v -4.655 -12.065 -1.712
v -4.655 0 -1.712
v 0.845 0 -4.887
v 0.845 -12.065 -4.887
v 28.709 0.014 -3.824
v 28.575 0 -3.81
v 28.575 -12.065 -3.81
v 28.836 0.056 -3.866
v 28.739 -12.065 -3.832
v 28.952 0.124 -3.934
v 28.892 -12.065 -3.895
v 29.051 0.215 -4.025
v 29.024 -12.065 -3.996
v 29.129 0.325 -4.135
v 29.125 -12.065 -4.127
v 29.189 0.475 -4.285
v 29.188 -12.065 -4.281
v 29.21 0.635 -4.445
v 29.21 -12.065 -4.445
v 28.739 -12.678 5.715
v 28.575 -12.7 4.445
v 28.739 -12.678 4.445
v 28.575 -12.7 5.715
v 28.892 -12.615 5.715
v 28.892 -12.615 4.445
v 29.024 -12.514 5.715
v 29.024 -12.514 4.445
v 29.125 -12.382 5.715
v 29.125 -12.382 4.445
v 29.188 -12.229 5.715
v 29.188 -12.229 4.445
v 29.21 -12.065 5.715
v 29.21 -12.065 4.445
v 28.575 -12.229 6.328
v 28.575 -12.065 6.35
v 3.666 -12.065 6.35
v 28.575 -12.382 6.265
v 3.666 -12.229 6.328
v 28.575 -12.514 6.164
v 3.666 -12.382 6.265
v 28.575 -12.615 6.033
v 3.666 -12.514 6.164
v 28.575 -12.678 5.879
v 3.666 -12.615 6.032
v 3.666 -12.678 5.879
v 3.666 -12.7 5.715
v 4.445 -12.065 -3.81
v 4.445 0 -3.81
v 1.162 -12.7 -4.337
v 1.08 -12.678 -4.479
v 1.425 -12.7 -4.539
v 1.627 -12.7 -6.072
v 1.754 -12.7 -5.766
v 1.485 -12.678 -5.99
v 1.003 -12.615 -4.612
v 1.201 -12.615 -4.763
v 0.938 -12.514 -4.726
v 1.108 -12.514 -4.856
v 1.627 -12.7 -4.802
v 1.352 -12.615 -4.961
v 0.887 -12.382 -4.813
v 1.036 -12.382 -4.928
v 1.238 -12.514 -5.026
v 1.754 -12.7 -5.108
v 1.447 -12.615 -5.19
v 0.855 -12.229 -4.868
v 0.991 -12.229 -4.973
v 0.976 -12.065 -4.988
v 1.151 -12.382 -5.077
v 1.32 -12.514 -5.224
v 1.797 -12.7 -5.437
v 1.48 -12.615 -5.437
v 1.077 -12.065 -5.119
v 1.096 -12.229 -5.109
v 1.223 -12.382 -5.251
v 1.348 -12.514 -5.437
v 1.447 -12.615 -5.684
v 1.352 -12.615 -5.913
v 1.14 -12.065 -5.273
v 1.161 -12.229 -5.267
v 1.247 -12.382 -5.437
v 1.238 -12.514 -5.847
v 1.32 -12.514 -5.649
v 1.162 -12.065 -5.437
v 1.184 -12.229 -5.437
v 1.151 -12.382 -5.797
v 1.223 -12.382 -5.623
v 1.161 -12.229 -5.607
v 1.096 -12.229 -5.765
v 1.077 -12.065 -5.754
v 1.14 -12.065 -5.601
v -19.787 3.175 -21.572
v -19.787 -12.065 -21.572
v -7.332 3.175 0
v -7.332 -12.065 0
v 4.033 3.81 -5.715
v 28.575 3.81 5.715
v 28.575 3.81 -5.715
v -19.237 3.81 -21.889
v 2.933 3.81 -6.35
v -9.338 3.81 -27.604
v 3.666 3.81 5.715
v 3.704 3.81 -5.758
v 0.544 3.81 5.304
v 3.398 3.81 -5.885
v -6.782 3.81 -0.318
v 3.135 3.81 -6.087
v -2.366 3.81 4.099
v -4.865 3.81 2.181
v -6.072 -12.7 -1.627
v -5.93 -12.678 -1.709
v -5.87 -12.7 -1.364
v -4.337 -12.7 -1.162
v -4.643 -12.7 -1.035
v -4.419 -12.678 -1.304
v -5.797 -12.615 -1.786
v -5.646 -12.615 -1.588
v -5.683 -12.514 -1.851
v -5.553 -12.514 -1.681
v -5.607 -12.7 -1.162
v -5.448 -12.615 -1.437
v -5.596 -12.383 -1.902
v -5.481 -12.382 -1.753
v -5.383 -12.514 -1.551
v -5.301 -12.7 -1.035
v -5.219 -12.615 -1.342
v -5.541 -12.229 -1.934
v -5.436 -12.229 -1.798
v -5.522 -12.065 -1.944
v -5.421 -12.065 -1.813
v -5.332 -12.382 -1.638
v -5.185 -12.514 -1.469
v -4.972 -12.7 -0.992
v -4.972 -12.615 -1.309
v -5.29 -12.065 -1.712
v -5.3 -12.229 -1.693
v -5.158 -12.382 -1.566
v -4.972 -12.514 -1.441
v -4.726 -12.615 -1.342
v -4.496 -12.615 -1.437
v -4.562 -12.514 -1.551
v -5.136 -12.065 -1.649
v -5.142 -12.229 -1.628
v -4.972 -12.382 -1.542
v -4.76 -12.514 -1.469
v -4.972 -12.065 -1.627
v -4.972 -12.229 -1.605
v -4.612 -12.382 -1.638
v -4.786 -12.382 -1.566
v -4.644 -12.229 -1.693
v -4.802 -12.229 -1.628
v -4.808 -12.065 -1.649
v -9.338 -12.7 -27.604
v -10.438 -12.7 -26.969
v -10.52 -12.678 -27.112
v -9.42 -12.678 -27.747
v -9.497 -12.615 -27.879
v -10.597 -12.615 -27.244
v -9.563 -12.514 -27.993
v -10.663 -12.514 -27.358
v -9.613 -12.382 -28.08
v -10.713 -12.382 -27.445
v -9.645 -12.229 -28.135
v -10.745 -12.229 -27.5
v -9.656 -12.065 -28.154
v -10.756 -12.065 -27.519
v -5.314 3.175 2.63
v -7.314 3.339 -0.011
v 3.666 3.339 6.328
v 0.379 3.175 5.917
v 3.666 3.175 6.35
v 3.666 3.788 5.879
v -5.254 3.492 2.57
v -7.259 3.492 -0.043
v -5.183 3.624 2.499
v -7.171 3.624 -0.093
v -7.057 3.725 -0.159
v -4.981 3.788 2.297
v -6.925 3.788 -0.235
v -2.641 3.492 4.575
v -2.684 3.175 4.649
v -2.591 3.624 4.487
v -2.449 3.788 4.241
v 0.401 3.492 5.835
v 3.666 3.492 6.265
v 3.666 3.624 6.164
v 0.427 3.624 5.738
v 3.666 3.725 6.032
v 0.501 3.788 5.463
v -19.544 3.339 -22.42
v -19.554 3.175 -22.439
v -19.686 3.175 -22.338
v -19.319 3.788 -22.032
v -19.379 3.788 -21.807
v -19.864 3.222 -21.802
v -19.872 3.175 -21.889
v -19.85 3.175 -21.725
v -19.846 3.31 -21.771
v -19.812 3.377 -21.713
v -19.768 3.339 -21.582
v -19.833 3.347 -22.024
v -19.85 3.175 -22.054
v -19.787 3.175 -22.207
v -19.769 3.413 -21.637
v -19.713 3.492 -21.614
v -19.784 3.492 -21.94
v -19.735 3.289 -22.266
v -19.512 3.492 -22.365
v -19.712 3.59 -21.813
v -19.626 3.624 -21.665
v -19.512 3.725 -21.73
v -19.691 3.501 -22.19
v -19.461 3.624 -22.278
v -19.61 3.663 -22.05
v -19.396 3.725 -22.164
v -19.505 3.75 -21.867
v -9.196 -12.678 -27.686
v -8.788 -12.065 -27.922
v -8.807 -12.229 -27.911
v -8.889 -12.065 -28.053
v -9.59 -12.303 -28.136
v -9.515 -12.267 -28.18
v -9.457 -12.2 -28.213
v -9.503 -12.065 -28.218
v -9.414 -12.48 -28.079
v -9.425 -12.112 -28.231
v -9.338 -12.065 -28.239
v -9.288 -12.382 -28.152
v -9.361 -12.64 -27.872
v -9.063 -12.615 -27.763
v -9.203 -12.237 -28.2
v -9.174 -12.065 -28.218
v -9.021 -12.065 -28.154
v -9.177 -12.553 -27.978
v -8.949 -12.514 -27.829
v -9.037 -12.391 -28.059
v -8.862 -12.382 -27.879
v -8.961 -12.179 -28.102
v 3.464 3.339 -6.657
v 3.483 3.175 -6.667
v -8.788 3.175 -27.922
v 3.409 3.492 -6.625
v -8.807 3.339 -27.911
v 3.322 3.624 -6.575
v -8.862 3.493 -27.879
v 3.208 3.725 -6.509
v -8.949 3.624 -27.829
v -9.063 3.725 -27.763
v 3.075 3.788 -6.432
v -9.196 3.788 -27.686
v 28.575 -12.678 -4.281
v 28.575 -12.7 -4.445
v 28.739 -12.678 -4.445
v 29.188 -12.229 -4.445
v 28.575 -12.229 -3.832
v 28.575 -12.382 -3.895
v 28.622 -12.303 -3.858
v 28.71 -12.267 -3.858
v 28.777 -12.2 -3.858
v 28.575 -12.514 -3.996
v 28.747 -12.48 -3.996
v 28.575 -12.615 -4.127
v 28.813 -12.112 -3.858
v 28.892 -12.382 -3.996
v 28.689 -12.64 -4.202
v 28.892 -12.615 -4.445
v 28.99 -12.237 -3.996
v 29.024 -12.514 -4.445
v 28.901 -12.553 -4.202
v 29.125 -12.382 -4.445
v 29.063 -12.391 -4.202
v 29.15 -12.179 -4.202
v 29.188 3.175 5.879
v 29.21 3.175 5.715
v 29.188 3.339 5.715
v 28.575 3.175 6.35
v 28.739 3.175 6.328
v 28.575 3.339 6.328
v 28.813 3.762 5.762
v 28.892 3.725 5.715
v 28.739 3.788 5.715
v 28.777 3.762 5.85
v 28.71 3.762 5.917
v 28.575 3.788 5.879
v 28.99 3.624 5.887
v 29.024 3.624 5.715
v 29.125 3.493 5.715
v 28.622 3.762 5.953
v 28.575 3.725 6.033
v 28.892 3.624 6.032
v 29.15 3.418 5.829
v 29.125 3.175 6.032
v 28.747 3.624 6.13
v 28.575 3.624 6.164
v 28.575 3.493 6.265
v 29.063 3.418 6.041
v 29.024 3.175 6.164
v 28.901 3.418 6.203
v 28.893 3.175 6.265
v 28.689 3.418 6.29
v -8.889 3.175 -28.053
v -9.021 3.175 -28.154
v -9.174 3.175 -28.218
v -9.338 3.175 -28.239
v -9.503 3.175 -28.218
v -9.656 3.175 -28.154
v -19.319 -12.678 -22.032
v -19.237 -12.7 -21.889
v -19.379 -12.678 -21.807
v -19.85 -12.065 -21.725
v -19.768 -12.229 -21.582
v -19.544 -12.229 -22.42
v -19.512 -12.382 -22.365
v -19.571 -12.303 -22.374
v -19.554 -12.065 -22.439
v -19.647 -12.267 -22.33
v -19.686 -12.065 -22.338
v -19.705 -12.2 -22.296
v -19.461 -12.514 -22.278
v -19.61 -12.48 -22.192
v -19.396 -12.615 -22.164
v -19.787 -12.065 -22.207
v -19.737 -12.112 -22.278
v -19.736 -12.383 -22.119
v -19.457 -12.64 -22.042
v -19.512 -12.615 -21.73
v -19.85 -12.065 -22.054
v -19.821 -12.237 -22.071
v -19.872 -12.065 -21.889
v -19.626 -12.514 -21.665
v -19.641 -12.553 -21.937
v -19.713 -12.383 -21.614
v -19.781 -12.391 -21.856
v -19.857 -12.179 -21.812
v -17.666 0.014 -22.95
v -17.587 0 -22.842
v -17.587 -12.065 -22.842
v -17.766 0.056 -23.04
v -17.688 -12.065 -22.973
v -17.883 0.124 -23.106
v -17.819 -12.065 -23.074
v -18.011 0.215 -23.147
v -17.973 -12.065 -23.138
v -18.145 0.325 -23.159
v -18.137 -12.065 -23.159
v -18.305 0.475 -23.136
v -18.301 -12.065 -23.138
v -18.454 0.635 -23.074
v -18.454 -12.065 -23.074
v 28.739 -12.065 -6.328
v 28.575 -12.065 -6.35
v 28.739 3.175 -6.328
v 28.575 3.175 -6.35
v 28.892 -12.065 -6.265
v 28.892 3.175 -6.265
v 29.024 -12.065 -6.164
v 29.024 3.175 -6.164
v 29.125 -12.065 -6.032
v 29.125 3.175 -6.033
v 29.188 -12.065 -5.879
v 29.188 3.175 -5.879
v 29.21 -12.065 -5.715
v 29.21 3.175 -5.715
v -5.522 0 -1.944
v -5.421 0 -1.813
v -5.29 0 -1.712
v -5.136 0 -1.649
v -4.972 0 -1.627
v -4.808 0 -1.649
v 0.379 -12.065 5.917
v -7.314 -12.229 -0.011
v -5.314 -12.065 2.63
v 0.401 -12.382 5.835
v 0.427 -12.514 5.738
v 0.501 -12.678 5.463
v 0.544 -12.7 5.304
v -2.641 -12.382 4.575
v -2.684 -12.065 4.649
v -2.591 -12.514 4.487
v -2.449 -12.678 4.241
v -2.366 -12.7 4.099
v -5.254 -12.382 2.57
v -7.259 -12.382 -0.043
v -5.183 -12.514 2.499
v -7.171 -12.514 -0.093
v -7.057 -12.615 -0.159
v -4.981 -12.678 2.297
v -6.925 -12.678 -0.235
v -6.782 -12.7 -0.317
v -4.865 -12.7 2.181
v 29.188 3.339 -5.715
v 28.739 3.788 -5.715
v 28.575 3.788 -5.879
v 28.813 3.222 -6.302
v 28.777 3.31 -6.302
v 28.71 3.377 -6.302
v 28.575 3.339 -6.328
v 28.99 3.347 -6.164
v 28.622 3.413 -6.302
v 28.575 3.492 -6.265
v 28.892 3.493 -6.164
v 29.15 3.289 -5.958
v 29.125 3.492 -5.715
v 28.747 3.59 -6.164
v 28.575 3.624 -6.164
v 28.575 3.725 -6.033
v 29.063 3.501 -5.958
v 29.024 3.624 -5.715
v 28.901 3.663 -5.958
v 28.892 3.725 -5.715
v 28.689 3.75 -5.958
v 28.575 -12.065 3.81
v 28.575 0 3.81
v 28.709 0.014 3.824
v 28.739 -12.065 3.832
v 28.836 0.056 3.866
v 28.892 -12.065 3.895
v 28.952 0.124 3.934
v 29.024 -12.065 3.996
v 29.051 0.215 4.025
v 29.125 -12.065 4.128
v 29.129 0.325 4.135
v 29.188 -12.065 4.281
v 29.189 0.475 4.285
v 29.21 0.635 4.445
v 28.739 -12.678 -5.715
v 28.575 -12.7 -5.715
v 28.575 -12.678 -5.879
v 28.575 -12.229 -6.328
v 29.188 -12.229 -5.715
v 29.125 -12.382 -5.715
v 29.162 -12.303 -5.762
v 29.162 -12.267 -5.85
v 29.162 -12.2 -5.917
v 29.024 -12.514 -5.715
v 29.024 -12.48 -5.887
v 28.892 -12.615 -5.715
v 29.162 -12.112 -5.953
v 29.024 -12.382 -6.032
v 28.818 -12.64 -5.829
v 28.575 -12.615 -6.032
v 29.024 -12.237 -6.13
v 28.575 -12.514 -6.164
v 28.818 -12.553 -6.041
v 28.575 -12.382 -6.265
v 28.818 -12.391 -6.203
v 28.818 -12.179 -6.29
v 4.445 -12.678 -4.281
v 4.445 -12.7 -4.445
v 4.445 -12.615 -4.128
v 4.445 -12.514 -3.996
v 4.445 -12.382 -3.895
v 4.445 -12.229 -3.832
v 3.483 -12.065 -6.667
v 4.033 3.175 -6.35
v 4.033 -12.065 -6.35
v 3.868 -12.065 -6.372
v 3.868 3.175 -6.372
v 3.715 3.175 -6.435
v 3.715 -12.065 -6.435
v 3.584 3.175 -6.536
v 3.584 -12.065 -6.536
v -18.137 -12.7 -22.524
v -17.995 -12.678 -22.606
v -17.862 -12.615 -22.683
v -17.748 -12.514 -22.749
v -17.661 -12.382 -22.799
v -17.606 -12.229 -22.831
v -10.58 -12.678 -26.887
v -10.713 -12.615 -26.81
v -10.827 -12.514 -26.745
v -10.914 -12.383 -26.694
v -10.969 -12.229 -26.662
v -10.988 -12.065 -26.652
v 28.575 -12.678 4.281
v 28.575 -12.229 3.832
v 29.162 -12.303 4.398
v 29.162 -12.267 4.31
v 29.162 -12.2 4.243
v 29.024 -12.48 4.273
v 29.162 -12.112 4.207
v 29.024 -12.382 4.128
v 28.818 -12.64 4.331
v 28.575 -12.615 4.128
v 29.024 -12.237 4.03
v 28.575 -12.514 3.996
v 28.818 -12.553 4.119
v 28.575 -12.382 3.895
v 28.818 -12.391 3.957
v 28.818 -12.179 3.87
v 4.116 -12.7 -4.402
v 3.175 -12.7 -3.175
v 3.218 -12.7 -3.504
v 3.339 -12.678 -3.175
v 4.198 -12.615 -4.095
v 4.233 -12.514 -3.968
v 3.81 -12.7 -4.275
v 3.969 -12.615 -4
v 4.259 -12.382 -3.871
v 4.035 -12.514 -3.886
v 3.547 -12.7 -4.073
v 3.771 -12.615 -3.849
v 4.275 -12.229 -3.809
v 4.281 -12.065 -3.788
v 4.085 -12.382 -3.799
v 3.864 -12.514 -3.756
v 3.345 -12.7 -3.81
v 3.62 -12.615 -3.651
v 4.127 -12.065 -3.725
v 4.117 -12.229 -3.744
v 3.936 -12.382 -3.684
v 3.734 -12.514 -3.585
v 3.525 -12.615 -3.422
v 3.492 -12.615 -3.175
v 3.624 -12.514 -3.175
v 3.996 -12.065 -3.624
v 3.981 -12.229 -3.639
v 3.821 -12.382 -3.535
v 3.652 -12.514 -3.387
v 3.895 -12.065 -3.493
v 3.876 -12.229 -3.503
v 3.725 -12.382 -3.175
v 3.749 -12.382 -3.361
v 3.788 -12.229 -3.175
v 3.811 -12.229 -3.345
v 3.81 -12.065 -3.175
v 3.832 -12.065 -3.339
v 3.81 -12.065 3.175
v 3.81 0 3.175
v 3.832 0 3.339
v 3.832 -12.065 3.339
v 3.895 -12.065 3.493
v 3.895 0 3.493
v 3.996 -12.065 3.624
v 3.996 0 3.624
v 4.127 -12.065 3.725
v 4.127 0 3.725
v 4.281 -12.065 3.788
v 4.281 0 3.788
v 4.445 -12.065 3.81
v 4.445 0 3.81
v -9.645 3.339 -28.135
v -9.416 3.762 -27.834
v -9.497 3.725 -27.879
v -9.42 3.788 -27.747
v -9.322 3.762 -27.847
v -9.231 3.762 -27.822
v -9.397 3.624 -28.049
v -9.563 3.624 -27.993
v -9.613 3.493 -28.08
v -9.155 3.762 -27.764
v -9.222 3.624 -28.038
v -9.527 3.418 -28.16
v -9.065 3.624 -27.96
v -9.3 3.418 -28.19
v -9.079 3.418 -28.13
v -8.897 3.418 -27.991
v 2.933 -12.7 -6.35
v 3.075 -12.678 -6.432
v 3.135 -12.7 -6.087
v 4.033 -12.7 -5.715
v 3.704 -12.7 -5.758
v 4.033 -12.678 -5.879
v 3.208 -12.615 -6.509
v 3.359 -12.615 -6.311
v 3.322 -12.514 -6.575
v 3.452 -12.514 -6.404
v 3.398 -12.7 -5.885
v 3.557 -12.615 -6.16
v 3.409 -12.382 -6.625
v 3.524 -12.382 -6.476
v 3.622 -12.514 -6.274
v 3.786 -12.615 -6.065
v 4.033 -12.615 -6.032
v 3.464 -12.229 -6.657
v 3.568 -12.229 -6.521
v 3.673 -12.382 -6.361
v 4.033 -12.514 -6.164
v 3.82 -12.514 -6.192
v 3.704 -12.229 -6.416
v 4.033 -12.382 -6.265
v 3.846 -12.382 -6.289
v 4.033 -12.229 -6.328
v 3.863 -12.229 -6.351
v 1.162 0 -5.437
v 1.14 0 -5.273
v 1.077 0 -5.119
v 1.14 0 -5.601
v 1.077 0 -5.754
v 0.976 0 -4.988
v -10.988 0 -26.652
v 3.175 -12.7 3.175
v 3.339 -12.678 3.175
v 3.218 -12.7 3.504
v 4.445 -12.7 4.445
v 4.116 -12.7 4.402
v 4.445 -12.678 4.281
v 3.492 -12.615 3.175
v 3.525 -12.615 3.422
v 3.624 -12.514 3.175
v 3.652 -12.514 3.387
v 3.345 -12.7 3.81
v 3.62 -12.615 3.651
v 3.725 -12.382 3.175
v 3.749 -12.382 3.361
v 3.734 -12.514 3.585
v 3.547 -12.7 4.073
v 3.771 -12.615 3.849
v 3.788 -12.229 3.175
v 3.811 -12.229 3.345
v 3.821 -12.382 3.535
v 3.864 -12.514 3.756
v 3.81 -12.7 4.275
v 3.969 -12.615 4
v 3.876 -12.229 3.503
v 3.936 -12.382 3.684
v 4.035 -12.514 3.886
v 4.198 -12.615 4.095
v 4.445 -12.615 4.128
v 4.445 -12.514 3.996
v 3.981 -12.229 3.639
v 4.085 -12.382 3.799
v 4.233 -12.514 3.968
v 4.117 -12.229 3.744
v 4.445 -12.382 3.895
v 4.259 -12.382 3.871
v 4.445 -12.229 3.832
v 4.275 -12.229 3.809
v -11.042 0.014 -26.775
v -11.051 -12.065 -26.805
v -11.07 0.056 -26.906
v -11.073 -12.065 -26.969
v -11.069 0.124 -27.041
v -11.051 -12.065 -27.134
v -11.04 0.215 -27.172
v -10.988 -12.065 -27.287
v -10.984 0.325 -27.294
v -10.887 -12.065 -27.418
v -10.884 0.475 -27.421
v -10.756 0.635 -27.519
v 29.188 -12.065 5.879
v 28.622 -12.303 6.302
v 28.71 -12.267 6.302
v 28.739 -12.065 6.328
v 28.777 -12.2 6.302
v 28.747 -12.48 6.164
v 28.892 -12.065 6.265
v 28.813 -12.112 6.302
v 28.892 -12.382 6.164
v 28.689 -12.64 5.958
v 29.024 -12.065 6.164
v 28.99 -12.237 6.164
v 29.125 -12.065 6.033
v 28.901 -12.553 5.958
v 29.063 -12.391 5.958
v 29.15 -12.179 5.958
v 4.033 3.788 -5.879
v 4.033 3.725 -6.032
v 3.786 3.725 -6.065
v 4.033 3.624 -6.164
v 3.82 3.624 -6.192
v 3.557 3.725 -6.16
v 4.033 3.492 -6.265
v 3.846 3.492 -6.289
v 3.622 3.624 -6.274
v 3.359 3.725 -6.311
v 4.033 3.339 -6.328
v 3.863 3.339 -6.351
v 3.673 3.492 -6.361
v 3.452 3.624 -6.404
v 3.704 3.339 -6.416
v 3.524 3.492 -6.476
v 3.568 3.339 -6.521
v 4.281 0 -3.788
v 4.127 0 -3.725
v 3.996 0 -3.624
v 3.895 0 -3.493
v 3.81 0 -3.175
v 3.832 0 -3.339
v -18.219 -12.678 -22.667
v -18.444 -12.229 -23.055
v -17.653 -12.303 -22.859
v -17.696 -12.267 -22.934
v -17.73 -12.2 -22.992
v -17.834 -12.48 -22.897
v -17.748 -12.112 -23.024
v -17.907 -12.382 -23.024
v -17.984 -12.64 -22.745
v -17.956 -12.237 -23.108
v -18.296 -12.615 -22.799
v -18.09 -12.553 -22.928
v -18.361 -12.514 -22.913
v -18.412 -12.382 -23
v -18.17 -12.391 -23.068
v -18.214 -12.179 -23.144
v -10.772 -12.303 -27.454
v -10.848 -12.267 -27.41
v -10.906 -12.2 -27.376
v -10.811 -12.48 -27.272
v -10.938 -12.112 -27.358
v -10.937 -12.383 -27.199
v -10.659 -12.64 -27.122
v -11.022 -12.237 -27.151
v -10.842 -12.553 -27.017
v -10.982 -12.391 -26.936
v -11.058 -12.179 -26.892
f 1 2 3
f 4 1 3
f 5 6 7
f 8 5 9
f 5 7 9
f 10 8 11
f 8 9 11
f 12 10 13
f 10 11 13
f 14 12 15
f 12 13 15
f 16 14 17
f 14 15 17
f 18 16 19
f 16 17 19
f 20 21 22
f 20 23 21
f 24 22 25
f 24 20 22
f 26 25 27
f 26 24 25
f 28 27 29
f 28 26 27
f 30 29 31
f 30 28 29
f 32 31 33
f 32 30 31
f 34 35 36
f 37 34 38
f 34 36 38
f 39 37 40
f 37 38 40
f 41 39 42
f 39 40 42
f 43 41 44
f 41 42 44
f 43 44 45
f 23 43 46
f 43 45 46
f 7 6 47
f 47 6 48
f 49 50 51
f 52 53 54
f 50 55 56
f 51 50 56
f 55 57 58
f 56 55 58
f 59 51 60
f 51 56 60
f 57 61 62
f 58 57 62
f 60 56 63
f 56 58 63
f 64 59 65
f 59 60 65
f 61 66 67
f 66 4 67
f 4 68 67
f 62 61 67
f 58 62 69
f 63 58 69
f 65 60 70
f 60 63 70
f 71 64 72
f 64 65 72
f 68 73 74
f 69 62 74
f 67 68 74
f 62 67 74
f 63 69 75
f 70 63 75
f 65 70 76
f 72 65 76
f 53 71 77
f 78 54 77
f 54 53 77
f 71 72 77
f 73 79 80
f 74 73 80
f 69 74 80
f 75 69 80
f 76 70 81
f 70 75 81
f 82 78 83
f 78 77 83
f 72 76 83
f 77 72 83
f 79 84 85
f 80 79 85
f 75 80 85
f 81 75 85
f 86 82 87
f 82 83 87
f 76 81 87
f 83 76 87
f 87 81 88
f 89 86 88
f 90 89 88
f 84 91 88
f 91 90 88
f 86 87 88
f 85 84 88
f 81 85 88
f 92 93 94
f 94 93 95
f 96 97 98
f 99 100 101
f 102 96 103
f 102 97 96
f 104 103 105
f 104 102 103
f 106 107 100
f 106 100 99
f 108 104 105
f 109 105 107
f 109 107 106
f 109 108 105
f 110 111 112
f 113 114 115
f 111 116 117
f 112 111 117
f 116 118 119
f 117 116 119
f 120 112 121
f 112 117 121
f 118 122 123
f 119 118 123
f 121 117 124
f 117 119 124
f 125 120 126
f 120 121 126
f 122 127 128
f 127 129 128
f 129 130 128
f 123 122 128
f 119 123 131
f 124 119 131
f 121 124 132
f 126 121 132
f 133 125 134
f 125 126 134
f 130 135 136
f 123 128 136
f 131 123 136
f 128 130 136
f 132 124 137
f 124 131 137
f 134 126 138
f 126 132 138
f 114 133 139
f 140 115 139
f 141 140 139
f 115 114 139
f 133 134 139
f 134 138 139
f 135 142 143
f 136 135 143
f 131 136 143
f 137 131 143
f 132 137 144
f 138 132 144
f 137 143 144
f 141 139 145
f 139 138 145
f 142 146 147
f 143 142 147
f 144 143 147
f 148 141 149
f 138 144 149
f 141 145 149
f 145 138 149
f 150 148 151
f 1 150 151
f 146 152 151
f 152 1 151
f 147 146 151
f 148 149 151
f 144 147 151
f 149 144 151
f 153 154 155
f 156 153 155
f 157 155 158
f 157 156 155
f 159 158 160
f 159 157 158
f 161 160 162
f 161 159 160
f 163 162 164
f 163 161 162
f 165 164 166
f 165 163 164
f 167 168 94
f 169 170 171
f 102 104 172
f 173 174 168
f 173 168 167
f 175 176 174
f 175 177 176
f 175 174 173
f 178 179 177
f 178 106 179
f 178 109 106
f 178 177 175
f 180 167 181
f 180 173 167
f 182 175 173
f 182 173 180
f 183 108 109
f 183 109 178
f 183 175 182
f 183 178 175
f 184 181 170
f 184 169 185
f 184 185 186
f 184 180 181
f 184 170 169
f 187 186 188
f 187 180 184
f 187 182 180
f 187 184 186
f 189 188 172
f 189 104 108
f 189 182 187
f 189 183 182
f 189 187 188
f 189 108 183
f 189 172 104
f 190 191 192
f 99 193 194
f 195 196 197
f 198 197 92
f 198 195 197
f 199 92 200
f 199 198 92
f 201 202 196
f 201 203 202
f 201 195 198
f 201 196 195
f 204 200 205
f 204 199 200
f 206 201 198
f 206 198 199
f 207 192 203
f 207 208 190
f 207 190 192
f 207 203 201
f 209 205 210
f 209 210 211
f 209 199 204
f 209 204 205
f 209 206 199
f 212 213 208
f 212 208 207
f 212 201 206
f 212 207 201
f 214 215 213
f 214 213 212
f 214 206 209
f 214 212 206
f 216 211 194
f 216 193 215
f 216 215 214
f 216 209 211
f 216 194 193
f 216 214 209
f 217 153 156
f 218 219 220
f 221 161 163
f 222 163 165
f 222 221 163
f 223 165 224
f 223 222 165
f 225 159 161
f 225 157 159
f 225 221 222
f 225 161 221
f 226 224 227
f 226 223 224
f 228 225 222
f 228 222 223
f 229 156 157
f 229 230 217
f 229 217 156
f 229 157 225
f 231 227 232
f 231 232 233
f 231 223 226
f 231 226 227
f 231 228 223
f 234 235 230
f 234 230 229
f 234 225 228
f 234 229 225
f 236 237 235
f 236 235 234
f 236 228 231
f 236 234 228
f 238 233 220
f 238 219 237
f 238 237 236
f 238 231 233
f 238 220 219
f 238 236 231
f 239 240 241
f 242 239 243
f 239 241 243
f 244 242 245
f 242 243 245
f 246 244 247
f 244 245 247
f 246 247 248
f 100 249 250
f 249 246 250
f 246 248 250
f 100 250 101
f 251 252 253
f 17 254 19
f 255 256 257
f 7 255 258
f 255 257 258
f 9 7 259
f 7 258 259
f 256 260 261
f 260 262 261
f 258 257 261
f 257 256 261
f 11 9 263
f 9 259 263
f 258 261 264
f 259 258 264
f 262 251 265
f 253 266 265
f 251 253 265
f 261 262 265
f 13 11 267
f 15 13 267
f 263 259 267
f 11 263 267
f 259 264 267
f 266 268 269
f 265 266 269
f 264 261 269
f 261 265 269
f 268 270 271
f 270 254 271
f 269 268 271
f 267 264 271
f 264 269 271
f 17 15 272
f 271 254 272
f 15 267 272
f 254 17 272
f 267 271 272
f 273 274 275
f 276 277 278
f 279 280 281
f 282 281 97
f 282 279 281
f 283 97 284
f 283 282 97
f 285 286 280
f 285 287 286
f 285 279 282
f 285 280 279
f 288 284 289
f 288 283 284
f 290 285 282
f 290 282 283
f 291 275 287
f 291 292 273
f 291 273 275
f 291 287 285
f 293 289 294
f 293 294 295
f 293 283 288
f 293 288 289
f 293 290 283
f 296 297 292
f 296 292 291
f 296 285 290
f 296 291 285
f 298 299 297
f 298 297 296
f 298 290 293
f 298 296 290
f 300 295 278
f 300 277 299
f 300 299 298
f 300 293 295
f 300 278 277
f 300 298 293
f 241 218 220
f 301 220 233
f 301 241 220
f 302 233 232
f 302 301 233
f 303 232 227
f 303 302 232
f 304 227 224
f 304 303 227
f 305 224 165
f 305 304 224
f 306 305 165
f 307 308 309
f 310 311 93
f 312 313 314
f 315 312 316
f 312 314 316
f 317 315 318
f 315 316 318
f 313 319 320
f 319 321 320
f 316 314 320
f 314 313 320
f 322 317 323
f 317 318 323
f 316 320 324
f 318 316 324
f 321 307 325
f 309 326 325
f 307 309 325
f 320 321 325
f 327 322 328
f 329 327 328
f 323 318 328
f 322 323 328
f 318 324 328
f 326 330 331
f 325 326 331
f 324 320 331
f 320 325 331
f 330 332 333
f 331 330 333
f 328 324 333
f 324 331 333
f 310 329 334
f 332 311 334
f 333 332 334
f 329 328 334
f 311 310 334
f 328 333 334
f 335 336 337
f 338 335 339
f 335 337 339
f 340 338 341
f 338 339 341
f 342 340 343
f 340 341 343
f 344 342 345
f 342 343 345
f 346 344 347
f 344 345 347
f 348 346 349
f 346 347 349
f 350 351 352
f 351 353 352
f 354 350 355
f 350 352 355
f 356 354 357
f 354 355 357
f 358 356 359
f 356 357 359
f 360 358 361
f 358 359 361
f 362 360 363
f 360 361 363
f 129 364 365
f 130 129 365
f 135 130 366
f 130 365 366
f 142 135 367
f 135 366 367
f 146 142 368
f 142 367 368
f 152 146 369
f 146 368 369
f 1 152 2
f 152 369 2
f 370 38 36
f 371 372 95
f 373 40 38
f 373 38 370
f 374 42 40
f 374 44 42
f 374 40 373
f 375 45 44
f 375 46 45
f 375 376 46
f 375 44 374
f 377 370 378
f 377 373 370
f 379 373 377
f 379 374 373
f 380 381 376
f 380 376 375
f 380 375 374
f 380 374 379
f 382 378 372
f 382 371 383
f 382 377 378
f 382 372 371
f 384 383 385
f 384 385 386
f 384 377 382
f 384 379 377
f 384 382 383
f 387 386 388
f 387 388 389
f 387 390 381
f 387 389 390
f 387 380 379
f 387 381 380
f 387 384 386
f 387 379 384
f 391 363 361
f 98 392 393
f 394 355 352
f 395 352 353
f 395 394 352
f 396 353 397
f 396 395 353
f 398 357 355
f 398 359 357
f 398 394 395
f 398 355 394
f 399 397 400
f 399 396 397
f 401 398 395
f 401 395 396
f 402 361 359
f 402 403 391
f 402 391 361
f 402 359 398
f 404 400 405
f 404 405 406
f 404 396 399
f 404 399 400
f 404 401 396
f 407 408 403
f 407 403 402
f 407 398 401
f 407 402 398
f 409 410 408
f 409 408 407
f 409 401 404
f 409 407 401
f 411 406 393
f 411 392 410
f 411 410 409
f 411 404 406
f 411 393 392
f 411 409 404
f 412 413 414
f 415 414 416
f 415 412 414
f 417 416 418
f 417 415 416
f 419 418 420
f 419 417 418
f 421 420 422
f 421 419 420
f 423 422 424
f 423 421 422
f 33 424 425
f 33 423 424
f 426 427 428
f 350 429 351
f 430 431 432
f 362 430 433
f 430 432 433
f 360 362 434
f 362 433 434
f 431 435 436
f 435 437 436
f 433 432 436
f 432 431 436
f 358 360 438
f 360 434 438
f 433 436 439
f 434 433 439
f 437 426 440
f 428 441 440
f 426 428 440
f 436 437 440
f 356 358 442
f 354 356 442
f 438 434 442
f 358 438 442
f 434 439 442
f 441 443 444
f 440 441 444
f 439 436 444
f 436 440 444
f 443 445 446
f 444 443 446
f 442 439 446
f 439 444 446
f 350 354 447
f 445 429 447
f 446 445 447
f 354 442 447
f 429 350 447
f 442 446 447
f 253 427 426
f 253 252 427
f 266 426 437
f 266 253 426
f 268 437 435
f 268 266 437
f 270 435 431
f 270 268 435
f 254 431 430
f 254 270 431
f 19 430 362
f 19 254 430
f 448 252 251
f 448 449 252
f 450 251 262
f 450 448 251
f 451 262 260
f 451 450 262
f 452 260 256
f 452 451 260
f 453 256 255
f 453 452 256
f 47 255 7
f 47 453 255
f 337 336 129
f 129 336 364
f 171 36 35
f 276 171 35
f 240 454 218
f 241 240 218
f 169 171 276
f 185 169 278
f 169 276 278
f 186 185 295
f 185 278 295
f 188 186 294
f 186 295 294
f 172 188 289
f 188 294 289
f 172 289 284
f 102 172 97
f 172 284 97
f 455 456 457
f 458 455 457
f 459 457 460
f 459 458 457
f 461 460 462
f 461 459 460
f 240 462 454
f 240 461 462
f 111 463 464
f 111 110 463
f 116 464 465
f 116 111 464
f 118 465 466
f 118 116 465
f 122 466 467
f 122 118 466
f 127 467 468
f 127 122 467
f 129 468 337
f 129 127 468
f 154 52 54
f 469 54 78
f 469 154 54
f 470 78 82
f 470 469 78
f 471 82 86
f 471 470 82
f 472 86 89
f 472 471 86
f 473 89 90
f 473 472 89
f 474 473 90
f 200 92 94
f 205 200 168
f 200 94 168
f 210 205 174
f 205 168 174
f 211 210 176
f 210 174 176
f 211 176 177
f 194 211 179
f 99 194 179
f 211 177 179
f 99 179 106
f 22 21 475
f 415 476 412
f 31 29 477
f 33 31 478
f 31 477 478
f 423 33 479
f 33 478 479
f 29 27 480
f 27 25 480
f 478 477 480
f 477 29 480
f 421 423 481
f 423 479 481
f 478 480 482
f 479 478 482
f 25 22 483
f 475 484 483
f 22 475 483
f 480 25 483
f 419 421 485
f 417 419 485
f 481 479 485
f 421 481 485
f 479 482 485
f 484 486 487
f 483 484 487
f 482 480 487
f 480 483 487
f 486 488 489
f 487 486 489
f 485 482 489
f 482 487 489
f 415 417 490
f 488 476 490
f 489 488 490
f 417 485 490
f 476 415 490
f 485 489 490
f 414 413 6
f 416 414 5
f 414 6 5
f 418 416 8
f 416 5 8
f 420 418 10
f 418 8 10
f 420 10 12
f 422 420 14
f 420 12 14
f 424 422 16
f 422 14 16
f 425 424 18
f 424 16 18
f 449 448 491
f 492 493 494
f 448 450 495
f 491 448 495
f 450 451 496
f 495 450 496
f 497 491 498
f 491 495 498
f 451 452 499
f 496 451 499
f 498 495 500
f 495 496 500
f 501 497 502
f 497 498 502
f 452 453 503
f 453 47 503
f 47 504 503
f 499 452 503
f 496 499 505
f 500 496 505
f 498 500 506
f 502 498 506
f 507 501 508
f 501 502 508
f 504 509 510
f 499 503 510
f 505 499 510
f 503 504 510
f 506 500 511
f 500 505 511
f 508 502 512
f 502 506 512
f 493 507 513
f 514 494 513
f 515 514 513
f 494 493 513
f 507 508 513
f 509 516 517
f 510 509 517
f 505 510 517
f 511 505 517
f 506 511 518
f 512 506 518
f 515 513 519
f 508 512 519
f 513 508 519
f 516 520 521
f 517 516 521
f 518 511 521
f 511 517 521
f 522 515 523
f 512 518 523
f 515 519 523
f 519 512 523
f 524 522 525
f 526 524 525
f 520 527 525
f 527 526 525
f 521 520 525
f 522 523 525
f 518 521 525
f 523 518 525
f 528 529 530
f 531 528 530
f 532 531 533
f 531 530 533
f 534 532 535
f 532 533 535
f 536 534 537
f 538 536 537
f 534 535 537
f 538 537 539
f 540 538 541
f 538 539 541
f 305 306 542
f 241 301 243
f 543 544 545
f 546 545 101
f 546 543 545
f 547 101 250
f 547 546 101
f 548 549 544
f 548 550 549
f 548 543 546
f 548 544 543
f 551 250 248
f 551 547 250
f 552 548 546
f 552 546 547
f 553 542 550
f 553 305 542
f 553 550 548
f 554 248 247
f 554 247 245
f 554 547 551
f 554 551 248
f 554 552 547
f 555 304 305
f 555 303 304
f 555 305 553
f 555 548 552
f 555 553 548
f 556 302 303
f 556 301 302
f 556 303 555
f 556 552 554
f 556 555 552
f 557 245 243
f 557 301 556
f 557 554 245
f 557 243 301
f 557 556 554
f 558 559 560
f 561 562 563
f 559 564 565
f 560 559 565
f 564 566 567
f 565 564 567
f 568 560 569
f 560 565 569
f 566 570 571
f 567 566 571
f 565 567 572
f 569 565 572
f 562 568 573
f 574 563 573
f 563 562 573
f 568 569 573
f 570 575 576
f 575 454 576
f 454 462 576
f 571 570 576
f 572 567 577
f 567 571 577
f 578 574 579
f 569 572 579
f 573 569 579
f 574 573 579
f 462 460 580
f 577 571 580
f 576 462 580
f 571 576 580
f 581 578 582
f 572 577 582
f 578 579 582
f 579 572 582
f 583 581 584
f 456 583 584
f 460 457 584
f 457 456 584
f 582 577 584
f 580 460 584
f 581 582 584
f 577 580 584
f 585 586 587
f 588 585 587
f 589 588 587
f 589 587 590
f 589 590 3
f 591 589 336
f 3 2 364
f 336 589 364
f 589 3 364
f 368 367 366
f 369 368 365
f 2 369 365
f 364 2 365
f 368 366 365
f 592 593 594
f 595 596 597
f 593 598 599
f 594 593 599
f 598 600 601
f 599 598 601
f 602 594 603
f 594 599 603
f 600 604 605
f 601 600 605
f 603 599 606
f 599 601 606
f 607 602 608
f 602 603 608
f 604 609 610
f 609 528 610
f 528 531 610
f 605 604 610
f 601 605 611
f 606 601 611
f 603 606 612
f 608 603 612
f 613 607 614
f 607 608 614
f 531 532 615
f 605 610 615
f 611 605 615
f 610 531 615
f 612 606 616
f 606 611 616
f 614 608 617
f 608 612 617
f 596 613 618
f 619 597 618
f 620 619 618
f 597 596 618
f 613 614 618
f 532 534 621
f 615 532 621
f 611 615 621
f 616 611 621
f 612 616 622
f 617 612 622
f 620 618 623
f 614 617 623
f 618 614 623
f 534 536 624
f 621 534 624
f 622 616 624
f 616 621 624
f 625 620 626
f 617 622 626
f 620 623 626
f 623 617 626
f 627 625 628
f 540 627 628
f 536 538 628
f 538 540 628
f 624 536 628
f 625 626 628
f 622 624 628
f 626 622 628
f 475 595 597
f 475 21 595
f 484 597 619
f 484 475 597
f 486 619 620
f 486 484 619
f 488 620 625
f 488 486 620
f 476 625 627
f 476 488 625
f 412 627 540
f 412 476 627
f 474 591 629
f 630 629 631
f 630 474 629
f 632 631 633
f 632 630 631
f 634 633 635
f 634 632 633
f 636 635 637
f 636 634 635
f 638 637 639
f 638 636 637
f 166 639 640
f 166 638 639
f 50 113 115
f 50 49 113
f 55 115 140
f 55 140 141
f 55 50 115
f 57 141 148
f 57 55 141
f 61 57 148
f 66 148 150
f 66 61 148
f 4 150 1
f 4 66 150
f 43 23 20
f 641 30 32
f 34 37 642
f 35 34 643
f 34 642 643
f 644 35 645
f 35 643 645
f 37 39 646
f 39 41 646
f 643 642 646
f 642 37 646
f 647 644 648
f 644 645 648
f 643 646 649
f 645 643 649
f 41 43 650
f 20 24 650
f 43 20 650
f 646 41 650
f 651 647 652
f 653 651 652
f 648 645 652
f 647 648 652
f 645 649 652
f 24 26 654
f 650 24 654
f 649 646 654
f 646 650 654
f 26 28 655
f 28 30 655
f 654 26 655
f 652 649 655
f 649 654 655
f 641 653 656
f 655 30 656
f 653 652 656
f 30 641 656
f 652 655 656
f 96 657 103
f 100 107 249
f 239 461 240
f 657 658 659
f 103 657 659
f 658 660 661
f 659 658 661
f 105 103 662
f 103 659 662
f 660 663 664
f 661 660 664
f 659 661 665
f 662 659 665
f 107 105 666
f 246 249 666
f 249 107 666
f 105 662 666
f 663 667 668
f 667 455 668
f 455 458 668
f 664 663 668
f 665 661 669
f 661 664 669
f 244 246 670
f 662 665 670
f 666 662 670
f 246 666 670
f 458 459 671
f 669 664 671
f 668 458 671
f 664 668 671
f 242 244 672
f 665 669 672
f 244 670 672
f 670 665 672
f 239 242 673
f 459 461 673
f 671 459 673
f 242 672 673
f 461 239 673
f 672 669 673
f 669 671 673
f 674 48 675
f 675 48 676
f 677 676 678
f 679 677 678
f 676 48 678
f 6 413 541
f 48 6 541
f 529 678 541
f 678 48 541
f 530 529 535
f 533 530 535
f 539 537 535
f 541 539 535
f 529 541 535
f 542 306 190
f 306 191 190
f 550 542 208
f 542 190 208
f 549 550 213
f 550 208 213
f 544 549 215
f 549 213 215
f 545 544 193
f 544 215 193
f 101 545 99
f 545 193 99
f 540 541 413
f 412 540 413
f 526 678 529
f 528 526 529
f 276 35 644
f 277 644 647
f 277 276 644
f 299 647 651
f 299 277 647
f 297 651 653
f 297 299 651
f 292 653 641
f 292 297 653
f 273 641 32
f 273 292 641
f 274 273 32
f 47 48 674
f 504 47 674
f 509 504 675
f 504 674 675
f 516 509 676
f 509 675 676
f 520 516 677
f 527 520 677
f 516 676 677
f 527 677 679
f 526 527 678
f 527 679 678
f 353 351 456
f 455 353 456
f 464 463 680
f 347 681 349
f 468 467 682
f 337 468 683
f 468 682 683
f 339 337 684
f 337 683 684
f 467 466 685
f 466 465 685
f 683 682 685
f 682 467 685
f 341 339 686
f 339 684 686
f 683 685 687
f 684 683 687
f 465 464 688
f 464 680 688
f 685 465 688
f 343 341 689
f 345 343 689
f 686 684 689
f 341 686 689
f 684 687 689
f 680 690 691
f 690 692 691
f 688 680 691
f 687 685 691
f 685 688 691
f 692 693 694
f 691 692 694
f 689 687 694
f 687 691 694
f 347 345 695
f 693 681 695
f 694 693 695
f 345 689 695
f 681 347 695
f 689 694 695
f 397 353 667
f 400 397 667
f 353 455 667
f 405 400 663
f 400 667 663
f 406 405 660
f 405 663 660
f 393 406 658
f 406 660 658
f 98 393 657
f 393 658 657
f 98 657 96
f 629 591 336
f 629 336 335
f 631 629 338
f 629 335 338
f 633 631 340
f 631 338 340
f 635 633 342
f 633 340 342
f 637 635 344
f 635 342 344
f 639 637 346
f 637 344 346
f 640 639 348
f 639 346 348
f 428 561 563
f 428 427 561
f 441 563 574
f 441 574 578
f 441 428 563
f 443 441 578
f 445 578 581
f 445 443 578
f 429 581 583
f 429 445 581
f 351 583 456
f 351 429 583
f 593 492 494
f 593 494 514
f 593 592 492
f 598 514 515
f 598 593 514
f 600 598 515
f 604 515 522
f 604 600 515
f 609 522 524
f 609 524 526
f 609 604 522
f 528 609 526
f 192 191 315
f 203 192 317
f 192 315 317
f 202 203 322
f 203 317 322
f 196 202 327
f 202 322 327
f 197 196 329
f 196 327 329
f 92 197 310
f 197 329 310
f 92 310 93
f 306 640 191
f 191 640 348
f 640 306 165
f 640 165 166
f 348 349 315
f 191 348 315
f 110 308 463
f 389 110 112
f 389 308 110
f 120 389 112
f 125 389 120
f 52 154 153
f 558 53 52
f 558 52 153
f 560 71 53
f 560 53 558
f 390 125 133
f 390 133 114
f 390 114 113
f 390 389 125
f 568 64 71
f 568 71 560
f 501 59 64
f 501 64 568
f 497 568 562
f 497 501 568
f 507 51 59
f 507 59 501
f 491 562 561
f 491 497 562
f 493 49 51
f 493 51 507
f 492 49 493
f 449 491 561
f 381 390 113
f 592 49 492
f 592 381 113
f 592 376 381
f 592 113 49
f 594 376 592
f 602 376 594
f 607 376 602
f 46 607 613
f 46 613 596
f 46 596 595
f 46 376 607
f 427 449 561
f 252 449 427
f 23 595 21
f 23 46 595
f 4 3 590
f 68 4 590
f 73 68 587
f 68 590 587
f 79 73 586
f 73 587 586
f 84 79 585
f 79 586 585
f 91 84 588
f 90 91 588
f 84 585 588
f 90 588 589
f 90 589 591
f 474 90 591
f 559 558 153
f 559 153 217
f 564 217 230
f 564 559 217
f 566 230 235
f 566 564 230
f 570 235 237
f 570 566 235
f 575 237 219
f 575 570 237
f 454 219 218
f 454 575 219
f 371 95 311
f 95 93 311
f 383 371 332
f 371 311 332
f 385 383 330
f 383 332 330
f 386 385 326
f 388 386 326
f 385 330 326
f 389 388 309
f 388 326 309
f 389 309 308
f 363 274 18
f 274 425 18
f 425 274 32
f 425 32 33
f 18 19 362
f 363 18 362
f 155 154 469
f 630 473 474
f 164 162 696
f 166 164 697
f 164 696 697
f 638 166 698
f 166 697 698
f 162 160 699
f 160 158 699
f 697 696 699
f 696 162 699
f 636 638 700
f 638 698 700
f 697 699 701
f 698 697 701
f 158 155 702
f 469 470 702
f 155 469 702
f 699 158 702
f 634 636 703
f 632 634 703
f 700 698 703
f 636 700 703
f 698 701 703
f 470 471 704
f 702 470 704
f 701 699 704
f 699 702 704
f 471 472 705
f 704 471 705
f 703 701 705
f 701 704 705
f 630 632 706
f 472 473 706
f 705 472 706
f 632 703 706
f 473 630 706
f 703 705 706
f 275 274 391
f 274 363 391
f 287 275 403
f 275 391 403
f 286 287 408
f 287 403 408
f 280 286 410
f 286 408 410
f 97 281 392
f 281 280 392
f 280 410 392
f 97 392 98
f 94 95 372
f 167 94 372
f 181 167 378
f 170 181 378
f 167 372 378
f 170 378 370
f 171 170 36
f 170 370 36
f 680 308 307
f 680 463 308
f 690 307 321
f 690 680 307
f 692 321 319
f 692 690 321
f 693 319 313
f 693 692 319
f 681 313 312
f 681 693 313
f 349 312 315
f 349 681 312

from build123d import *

# Parameters (mm, degrees)
F1_DEPTH = 12.7
F3_DEPTH = 3.81
F4_R     = 0.635


with BuildPart() as f1:
    # F0 (on Front) → F1 (new body)
    with BuildSketch(Plane.XZ):
        with BuildLine():
            Line((4.445, 3.81), (29.21, 3.81))
            Line((29.21, 3.81), (29.21, 6.35))
            Line((29.21, 6.35), (3.6661742094, 6.35))
            ThreePointArc((3.6661742094, 6.35), (-2.6838257906, 4.6485226281), (-7.3323484187, 0))
            Line((-7.3323484187, 0), (-20.104261314, -22.1216020445))
            Line((-20.104261314, -22.1216020445), (-17.9045567884, -23.3916020445))
            Line((-17.9045567884, -23.3916020445), (-5.5220567884, -1.9444829198))
            ThreePointArc((-5.5220567884, -1.9444829198), (-5.1364807507, -1.6486200201), (-4.654630657, -1.7120567884))
            Line((-4.654630657, -1.7120567884), (0.844630657, -4.8870567884))
            ThreePointArc((0.844630657, -4.8870567884), (1.1404935567, -5.2726328262), (1.0770567884, -5.7544829198))
            Line((1.0770567884, -5.7544829198), (-11.3054432116, -27.2016020445))
            Line((-11.3054432116, -27.2016020445), (-9.105738686, -28.4716020445))
            Line((-9.105738686, -28.4716020445), (3.6661742094, -6.35))
            Line((3.6661742094, -6.35), (29.21, -6.35))
            Line((29.21, -6.35), (29.21, -3.81))
            Line((29.21, -3.81), (4.445, -3.81))
            ThreePointArc((4.445, -3.81), (3.9959871939, -3.6240128061), (3.81, -3.175))
            Line((3.81, -3.175), (3.81, 3.175))
            ThreePointArc((3.81, 3.175), (3.9959871939, 3.6240128061), (4.445, 3.81))
        make_face()
    extrude(amount=F1_DEPTH)

    # F2 (on face) → F3 (join)
    with BuildSketch(Plane(origin=(0, 0, 0), x_dir=(-1, 0, 0), z_dir=(0, 1, 0))):
        with BuildLine():
            Line((-3.6661742094, 6.35), (-29.21, 6.35))
            Line((-29.21, 6.35), (-29.21, -6.35))
            Line((-29.21, -6.35), (-3.6661742094, -6.35))
            Line((-3.6661742094, -6.35), (9.105738686, -28.4716020445))
            Line((9.105738686, -28.4716020445), (11.3054432116, -27.2016020445))
            Line((11.3054432116, -27.2016020445), (20.104261314, -22.1216020445))
            Line((20.104261314, -22.1216020445), (7.3323484187, 0))
            ThreePointArc((7.3323484187, 0), (2.6838257906, 4.6485226281), (-3.6661742094, 6.35))
        make_face()
    extrude(amount=F3_DEPTH)

    # F4
    f4_edges = [f1.edges().sort_by_distance(p)[0] for p in [
        (-2.719782, -12.7, -17.410801),
        (16.438087, -12.7, -6.35),
        (29.21, -12.7, -5.08),
        (16.8275, -12.7, -3.81),
        (3.995987, -12.7, -3.624013),
        (3.81, -12.7, 0),
        (3.995987, -12.7, 3.624013),
        (16.8275, -12.7, 3.81),
        (29.21, -12.7, 5.08),
        (16.438087, -12.7, 6.35),
        (-2.683826, -12.7, 4.648523),
        (-13.718305, -12.7, -11.060801),
        (-19.004409, -12.7, -22.756602),
        (-11.713307, -12.7, -12.668042),
        (-5.136481, -12.7, -1.64862),
        (-1.905, -12.7, -3.299557),
        (1.140494, -12.7, -5.272633),
        (-5.114193, -12.7, -16.478042),
        (-10.205591, -12.7, -27.836602),
        (29.21, -6.35, -3.81),
        (29.21, 0, 0),
        (29.21, -6.35, 3.81),
        (29.21, -4.445, 6.35),
        (29.21, 3.81, 0),
        (29.21, -4.445, -6.35),
        (-11.305443, -6.35, -27.201602),
        (-9.105739, -4.445, -28.471602),
        (-14.605, 3.81, -25.296602),
        (-20.104261, -4.445, -22.121602),
        (-17.904557, -6.35, -23.391602),
        (-14.605, 0, -25.296602),
        (16.438087, 3.81, 6.35),
        (16.438087, 3.81, -6.35),
        (-2.719782, 3.81, -17.410801),
        (-13.718305, 3.81, -11.060801),
        (-2.683826, 3.81, 4.648523),
        (3.666174, -4.445, -6.35),
    ]]
    fillet(f4_edges, radius=F4_R)


solid = f1.part
